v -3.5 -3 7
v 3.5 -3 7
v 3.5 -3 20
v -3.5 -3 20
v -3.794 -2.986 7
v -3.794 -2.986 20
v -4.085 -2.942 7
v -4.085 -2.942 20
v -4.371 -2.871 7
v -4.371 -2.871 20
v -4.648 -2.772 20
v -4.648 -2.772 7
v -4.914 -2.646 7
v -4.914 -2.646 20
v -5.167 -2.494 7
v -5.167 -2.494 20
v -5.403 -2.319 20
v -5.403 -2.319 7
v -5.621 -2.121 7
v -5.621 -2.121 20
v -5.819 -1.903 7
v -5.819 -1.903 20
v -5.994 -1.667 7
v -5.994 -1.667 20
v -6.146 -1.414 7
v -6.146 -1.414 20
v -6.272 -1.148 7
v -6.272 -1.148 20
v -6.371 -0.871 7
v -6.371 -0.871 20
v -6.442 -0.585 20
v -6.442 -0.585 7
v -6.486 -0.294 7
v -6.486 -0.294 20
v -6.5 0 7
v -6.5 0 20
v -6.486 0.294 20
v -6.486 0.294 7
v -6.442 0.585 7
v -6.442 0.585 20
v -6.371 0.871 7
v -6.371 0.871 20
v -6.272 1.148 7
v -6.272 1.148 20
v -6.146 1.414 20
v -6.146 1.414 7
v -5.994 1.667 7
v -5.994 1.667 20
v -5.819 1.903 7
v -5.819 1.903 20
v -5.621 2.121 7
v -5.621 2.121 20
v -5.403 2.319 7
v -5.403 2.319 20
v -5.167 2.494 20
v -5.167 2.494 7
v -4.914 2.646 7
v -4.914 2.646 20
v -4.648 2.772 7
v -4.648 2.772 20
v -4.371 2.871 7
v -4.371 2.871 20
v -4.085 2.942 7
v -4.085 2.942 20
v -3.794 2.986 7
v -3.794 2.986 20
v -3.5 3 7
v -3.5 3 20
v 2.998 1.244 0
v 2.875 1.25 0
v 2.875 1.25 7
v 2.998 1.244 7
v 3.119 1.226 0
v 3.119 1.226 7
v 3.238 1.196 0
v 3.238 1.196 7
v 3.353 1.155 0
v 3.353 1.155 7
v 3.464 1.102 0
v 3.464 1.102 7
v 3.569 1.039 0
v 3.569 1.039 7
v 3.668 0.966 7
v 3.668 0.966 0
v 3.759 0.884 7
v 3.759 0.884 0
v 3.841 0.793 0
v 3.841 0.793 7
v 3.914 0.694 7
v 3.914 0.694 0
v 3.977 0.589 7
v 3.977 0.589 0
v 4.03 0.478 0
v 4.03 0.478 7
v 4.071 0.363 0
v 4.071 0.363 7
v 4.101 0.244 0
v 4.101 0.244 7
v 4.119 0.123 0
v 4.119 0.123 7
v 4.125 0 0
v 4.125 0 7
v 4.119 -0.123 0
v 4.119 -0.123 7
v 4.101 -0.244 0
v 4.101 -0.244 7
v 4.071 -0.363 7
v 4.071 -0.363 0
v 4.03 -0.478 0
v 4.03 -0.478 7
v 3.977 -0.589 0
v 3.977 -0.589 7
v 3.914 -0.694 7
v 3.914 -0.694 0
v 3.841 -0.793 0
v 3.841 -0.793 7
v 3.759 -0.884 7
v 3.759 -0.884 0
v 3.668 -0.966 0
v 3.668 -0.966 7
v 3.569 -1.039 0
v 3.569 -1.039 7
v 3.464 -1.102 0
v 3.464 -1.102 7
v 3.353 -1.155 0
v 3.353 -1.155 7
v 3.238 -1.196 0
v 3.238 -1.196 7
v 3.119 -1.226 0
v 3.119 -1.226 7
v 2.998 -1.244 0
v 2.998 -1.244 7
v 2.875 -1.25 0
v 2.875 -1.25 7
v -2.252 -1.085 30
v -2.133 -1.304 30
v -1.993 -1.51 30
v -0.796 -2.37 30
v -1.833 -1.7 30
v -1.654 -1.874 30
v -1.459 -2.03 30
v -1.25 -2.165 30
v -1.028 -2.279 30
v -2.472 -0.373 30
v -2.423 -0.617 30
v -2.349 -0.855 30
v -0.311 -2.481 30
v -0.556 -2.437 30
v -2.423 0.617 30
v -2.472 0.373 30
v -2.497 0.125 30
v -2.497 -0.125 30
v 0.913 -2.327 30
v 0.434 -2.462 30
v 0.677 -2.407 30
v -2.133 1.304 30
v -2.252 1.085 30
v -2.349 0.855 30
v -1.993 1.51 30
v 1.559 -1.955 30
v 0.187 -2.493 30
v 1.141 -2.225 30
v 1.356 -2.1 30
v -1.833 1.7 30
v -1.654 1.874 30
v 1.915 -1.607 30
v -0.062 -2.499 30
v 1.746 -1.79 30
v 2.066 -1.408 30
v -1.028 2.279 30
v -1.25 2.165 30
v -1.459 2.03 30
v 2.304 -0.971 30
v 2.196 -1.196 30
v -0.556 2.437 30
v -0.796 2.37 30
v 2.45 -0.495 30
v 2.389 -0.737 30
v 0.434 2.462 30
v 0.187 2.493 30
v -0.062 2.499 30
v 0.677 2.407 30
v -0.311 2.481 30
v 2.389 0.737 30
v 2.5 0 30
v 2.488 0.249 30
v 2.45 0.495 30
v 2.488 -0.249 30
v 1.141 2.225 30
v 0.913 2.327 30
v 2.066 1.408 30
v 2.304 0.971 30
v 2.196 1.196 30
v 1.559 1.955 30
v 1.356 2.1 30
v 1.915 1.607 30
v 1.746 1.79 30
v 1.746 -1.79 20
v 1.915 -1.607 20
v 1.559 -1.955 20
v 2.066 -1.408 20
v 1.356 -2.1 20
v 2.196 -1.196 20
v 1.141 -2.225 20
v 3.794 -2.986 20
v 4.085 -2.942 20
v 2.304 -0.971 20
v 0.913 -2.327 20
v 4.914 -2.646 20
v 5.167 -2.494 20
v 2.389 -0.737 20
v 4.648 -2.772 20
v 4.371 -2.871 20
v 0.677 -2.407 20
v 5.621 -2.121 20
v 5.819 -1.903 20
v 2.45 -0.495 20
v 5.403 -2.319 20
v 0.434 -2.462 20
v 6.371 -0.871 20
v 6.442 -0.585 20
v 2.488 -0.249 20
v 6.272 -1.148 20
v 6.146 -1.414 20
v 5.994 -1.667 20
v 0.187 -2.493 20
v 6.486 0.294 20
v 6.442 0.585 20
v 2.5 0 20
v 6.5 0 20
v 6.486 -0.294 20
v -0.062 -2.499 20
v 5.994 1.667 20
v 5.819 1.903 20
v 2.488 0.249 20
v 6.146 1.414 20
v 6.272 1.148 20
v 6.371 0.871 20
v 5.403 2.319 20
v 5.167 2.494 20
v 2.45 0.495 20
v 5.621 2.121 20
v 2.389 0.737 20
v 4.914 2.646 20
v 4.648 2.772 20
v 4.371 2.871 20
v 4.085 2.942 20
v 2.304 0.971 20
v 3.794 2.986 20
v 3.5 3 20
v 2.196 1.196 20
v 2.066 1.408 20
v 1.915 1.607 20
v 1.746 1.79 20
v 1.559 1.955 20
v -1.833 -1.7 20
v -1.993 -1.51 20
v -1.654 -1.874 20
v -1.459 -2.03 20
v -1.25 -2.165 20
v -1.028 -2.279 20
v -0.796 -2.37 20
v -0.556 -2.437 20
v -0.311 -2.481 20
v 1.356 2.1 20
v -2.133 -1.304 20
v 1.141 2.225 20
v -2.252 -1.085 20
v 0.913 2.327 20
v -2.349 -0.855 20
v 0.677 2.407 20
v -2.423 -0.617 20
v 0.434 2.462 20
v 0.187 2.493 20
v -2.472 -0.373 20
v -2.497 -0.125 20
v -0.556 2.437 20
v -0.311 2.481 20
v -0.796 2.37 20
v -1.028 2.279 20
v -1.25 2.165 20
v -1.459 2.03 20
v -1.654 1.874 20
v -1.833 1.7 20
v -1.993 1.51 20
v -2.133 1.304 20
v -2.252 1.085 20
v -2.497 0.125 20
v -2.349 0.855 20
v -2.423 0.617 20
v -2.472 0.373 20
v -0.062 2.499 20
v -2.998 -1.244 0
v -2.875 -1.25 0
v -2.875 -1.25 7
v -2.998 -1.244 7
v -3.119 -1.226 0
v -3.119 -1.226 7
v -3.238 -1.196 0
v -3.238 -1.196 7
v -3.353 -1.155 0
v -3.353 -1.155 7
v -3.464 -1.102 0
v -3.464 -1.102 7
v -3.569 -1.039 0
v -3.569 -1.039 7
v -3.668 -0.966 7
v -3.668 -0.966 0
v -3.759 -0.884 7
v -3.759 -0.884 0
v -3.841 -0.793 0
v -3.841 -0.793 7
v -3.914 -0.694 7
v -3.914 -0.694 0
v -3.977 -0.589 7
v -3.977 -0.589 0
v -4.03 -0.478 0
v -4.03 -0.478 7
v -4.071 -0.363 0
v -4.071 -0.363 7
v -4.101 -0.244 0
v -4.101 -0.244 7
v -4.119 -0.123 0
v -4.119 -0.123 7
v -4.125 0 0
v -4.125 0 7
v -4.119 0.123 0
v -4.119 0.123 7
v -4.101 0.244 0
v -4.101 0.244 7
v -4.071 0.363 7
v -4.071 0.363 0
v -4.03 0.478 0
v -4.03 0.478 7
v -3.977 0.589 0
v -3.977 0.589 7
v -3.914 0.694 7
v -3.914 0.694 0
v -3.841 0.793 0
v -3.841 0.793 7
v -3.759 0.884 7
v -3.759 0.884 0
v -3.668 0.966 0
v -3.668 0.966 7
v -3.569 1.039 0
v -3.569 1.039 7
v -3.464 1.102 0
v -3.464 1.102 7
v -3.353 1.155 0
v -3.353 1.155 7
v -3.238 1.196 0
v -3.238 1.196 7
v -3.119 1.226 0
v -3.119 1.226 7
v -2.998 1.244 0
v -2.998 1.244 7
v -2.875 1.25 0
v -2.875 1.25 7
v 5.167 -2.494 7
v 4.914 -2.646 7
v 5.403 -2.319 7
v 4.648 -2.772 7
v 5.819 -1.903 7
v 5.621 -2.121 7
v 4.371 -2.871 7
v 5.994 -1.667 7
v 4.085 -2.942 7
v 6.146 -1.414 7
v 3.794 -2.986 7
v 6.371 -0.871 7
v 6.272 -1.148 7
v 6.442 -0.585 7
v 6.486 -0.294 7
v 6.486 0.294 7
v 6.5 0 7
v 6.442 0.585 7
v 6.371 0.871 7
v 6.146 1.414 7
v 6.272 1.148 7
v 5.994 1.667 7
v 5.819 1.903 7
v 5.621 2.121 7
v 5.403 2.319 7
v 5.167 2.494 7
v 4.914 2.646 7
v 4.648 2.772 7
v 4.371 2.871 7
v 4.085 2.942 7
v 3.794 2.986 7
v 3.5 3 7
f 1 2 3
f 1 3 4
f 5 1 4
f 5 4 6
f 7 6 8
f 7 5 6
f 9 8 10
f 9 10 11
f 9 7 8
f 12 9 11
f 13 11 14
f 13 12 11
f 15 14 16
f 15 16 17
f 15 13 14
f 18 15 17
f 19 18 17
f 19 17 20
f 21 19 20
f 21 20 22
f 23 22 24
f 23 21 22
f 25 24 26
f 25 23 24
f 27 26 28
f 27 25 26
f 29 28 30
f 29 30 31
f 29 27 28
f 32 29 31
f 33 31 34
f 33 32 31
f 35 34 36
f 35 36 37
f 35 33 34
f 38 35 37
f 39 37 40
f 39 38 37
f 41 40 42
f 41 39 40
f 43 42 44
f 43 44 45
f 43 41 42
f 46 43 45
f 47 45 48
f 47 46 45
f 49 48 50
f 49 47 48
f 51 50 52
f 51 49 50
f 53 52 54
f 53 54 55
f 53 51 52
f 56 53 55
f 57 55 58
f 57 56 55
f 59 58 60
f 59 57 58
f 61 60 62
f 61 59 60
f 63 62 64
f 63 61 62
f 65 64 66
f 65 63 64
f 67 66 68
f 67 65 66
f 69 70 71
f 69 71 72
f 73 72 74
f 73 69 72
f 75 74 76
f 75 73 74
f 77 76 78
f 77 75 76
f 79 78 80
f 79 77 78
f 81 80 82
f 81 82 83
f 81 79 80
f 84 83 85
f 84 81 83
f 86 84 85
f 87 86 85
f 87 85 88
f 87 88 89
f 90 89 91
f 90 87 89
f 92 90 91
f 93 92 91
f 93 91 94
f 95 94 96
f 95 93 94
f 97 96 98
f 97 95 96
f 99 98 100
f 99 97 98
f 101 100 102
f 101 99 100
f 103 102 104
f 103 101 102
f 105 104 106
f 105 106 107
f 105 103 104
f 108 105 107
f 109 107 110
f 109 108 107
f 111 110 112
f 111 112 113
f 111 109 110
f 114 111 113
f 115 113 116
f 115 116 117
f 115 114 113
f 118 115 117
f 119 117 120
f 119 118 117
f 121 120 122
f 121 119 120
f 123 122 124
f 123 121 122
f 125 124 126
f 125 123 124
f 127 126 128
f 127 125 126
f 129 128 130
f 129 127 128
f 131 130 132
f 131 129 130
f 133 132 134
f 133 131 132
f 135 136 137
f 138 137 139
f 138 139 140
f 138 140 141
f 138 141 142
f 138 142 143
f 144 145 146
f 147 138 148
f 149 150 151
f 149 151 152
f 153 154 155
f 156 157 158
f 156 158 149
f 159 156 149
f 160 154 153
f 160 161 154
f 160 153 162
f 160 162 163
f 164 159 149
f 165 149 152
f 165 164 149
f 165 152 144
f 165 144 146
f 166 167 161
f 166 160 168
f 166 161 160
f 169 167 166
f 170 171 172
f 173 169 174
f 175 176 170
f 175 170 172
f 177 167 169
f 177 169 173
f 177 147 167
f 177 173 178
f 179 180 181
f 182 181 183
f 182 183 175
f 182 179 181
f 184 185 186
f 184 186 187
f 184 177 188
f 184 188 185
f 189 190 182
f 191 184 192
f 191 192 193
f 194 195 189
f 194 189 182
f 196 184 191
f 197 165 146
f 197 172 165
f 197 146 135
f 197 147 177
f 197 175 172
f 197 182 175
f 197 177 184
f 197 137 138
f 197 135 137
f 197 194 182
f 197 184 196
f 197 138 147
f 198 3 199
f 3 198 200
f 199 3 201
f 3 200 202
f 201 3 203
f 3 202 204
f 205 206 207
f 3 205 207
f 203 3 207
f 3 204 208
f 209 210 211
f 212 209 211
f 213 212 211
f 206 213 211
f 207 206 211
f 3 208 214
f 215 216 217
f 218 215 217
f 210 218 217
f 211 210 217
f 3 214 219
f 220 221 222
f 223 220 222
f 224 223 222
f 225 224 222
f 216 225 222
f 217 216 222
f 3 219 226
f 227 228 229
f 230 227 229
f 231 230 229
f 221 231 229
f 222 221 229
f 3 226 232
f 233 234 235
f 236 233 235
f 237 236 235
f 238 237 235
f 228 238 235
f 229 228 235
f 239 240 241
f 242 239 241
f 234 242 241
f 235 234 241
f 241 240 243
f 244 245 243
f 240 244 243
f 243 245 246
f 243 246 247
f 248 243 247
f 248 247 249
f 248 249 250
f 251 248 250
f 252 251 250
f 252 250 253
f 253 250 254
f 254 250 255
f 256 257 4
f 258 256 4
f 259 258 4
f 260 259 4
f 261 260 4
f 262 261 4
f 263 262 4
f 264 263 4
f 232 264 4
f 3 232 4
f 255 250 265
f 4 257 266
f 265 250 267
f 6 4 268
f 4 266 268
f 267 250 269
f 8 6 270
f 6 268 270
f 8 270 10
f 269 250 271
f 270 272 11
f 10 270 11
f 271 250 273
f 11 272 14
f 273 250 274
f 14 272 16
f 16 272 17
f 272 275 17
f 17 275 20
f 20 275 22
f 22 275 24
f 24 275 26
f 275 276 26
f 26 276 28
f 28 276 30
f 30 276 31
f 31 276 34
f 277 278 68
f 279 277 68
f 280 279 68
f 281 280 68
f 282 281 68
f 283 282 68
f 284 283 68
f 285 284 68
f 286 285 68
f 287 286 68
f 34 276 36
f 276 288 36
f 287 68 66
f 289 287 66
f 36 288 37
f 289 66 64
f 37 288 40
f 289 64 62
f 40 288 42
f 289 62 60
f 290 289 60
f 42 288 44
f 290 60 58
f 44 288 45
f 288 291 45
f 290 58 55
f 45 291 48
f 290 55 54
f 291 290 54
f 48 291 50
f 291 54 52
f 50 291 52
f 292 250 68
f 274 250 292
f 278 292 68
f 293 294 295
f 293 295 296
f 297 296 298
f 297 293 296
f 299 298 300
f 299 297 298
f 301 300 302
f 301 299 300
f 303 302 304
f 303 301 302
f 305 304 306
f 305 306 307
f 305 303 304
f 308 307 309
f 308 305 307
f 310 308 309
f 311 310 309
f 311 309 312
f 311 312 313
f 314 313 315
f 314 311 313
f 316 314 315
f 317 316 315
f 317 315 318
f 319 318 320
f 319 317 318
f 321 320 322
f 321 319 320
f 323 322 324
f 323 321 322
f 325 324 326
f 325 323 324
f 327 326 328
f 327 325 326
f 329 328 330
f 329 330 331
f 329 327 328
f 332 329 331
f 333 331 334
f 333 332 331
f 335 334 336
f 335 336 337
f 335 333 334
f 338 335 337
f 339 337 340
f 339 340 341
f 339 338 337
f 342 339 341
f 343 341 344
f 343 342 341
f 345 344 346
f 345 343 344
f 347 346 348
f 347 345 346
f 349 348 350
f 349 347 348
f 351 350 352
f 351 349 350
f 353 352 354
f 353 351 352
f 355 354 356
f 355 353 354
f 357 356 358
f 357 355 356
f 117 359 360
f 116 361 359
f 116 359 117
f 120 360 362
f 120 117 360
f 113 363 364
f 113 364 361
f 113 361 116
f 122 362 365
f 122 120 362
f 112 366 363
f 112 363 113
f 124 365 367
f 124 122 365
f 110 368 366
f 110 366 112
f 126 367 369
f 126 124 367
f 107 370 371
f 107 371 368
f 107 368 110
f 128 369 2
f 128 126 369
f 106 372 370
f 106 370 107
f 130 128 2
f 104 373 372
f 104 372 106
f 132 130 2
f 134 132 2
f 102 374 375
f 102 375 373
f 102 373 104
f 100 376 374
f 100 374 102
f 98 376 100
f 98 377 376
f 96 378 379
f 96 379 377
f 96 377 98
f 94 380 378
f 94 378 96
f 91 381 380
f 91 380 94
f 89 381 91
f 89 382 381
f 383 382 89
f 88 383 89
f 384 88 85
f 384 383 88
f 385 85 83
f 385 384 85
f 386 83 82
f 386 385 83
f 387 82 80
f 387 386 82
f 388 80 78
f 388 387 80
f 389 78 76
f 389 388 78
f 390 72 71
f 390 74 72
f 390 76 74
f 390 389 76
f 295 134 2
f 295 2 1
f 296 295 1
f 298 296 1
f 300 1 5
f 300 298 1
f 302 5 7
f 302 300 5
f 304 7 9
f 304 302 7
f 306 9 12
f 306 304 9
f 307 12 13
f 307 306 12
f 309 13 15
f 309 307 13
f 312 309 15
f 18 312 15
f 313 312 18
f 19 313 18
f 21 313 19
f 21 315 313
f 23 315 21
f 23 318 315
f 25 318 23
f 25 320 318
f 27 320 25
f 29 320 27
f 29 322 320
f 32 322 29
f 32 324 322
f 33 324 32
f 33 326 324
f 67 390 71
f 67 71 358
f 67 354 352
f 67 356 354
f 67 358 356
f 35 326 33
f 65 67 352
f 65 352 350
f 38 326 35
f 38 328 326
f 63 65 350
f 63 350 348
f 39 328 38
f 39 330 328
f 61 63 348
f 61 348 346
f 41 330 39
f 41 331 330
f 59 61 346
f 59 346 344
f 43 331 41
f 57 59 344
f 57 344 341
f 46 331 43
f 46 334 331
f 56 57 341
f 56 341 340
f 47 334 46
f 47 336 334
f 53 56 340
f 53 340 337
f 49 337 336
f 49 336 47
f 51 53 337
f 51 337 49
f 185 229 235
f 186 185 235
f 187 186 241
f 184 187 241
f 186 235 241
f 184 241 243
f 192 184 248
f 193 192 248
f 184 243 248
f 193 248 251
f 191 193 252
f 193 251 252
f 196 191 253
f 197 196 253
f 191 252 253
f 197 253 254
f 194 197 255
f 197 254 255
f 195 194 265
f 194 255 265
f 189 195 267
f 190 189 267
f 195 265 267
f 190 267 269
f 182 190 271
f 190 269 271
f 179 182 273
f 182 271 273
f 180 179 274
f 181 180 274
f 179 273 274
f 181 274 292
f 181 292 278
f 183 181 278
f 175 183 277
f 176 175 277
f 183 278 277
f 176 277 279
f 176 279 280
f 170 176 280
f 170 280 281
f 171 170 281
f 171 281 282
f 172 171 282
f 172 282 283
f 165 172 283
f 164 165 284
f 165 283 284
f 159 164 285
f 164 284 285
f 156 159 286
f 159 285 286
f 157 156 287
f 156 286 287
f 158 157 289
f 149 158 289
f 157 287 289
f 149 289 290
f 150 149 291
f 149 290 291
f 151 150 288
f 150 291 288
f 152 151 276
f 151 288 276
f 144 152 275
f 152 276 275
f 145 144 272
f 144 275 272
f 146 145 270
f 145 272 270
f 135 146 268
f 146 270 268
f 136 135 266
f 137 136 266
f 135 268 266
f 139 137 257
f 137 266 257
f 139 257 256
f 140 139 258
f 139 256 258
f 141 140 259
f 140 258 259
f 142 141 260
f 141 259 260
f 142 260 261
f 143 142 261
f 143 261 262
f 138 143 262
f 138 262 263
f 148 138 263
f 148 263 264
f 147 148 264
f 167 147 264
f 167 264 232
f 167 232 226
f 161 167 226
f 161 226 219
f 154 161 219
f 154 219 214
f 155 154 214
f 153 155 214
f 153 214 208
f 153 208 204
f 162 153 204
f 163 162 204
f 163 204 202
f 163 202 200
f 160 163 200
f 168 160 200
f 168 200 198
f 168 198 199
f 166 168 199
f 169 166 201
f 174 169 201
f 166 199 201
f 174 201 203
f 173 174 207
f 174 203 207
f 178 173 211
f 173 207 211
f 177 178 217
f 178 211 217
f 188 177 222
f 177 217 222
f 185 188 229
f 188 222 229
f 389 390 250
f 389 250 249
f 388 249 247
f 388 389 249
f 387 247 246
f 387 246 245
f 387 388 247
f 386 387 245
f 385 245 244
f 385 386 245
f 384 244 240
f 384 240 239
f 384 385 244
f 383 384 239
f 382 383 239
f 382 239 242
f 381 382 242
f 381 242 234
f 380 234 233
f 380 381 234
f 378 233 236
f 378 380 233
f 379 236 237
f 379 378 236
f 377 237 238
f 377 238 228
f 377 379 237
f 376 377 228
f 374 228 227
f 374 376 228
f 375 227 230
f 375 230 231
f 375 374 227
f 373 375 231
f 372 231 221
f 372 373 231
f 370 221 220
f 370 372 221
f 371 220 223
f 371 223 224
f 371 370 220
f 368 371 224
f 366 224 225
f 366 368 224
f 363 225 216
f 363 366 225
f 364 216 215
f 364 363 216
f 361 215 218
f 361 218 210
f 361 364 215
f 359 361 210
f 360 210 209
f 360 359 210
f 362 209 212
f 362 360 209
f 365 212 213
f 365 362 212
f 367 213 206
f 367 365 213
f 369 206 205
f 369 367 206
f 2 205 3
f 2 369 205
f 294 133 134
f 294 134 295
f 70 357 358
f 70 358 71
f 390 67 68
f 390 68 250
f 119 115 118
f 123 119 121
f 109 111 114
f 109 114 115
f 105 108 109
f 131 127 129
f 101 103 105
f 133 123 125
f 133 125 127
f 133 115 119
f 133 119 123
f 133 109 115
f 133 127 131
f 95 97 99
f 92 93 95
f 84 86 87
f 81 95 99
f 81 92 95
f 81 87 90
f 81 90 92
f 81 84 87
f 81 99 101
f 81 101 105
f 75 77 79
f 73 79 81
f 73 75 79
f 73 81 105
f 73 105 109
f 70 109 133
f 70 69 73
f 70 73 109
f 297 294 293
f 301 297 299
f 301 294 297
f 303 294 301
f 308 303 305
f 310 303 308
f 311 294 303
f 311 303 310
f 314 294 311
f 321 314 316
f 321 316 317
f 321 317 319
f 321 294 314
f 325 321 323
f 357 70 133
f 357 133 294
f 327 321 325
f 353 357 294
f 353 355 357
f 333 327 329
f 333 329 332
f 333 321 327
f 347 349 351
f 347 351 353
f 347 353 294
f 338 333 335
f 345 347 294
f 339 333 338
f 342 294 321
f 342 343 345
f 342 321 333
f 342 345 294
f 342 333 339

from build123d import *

# Parameters (mm, degrees)
BOSS_EXTRUDE1_DEPTH = 7
BOSS_EXTRUDE2_DEPTH = 13
SKETCH3_R           = 2.5
BOSS_EXTRUDE3_DEPTH = 10


with BuildPart() as part:
    # Sketch1 → Boss-Extrude1 (new body)
    with BuildSketch(Plane.XY):
        with BuildLine():
            Line((-2.875, 1.25), (2.875, 1.25))
            ThreePointArc((2.875, 1.25), (4.125, 0), (2.875, -1.25))
            Line((2.875, -1.25), (-2.875, -1.25))
            ThreePointArc((-2.875, -1.25), (-4.125, 0), (-2.875, 1.25))
        make_face()
    extrude(amount=BOSS_EXTRUDE1_DEPTH)

    # Sketch2 → Boss-Extrude2 (add)
    with BuildSketch(Plane.XY.offset(7)):
        with BuildLine():
            Line((-3.5, 3), (3.5, 3))
            ThreePointArc((3.5, 3), (6.5, 0), (3.5, -3))
            Line((3.5, -3), (-3.5, -3))
            ThreePointArc((-3.5, -3), (-6.5, 0), (-3.5, 3))
        make_face()
    extrude(amount=BOSS_EXTRUDE2_DEPTH)

    # Sketch3 → Boss-Extrude3 (add)
    with BuildSketch(Plane.XY.offset(20)):
        Circle(SKETCH3_R)
    extrude(amount=BOSS_EXTRUDE3_DEPTH)


solid = part.part
